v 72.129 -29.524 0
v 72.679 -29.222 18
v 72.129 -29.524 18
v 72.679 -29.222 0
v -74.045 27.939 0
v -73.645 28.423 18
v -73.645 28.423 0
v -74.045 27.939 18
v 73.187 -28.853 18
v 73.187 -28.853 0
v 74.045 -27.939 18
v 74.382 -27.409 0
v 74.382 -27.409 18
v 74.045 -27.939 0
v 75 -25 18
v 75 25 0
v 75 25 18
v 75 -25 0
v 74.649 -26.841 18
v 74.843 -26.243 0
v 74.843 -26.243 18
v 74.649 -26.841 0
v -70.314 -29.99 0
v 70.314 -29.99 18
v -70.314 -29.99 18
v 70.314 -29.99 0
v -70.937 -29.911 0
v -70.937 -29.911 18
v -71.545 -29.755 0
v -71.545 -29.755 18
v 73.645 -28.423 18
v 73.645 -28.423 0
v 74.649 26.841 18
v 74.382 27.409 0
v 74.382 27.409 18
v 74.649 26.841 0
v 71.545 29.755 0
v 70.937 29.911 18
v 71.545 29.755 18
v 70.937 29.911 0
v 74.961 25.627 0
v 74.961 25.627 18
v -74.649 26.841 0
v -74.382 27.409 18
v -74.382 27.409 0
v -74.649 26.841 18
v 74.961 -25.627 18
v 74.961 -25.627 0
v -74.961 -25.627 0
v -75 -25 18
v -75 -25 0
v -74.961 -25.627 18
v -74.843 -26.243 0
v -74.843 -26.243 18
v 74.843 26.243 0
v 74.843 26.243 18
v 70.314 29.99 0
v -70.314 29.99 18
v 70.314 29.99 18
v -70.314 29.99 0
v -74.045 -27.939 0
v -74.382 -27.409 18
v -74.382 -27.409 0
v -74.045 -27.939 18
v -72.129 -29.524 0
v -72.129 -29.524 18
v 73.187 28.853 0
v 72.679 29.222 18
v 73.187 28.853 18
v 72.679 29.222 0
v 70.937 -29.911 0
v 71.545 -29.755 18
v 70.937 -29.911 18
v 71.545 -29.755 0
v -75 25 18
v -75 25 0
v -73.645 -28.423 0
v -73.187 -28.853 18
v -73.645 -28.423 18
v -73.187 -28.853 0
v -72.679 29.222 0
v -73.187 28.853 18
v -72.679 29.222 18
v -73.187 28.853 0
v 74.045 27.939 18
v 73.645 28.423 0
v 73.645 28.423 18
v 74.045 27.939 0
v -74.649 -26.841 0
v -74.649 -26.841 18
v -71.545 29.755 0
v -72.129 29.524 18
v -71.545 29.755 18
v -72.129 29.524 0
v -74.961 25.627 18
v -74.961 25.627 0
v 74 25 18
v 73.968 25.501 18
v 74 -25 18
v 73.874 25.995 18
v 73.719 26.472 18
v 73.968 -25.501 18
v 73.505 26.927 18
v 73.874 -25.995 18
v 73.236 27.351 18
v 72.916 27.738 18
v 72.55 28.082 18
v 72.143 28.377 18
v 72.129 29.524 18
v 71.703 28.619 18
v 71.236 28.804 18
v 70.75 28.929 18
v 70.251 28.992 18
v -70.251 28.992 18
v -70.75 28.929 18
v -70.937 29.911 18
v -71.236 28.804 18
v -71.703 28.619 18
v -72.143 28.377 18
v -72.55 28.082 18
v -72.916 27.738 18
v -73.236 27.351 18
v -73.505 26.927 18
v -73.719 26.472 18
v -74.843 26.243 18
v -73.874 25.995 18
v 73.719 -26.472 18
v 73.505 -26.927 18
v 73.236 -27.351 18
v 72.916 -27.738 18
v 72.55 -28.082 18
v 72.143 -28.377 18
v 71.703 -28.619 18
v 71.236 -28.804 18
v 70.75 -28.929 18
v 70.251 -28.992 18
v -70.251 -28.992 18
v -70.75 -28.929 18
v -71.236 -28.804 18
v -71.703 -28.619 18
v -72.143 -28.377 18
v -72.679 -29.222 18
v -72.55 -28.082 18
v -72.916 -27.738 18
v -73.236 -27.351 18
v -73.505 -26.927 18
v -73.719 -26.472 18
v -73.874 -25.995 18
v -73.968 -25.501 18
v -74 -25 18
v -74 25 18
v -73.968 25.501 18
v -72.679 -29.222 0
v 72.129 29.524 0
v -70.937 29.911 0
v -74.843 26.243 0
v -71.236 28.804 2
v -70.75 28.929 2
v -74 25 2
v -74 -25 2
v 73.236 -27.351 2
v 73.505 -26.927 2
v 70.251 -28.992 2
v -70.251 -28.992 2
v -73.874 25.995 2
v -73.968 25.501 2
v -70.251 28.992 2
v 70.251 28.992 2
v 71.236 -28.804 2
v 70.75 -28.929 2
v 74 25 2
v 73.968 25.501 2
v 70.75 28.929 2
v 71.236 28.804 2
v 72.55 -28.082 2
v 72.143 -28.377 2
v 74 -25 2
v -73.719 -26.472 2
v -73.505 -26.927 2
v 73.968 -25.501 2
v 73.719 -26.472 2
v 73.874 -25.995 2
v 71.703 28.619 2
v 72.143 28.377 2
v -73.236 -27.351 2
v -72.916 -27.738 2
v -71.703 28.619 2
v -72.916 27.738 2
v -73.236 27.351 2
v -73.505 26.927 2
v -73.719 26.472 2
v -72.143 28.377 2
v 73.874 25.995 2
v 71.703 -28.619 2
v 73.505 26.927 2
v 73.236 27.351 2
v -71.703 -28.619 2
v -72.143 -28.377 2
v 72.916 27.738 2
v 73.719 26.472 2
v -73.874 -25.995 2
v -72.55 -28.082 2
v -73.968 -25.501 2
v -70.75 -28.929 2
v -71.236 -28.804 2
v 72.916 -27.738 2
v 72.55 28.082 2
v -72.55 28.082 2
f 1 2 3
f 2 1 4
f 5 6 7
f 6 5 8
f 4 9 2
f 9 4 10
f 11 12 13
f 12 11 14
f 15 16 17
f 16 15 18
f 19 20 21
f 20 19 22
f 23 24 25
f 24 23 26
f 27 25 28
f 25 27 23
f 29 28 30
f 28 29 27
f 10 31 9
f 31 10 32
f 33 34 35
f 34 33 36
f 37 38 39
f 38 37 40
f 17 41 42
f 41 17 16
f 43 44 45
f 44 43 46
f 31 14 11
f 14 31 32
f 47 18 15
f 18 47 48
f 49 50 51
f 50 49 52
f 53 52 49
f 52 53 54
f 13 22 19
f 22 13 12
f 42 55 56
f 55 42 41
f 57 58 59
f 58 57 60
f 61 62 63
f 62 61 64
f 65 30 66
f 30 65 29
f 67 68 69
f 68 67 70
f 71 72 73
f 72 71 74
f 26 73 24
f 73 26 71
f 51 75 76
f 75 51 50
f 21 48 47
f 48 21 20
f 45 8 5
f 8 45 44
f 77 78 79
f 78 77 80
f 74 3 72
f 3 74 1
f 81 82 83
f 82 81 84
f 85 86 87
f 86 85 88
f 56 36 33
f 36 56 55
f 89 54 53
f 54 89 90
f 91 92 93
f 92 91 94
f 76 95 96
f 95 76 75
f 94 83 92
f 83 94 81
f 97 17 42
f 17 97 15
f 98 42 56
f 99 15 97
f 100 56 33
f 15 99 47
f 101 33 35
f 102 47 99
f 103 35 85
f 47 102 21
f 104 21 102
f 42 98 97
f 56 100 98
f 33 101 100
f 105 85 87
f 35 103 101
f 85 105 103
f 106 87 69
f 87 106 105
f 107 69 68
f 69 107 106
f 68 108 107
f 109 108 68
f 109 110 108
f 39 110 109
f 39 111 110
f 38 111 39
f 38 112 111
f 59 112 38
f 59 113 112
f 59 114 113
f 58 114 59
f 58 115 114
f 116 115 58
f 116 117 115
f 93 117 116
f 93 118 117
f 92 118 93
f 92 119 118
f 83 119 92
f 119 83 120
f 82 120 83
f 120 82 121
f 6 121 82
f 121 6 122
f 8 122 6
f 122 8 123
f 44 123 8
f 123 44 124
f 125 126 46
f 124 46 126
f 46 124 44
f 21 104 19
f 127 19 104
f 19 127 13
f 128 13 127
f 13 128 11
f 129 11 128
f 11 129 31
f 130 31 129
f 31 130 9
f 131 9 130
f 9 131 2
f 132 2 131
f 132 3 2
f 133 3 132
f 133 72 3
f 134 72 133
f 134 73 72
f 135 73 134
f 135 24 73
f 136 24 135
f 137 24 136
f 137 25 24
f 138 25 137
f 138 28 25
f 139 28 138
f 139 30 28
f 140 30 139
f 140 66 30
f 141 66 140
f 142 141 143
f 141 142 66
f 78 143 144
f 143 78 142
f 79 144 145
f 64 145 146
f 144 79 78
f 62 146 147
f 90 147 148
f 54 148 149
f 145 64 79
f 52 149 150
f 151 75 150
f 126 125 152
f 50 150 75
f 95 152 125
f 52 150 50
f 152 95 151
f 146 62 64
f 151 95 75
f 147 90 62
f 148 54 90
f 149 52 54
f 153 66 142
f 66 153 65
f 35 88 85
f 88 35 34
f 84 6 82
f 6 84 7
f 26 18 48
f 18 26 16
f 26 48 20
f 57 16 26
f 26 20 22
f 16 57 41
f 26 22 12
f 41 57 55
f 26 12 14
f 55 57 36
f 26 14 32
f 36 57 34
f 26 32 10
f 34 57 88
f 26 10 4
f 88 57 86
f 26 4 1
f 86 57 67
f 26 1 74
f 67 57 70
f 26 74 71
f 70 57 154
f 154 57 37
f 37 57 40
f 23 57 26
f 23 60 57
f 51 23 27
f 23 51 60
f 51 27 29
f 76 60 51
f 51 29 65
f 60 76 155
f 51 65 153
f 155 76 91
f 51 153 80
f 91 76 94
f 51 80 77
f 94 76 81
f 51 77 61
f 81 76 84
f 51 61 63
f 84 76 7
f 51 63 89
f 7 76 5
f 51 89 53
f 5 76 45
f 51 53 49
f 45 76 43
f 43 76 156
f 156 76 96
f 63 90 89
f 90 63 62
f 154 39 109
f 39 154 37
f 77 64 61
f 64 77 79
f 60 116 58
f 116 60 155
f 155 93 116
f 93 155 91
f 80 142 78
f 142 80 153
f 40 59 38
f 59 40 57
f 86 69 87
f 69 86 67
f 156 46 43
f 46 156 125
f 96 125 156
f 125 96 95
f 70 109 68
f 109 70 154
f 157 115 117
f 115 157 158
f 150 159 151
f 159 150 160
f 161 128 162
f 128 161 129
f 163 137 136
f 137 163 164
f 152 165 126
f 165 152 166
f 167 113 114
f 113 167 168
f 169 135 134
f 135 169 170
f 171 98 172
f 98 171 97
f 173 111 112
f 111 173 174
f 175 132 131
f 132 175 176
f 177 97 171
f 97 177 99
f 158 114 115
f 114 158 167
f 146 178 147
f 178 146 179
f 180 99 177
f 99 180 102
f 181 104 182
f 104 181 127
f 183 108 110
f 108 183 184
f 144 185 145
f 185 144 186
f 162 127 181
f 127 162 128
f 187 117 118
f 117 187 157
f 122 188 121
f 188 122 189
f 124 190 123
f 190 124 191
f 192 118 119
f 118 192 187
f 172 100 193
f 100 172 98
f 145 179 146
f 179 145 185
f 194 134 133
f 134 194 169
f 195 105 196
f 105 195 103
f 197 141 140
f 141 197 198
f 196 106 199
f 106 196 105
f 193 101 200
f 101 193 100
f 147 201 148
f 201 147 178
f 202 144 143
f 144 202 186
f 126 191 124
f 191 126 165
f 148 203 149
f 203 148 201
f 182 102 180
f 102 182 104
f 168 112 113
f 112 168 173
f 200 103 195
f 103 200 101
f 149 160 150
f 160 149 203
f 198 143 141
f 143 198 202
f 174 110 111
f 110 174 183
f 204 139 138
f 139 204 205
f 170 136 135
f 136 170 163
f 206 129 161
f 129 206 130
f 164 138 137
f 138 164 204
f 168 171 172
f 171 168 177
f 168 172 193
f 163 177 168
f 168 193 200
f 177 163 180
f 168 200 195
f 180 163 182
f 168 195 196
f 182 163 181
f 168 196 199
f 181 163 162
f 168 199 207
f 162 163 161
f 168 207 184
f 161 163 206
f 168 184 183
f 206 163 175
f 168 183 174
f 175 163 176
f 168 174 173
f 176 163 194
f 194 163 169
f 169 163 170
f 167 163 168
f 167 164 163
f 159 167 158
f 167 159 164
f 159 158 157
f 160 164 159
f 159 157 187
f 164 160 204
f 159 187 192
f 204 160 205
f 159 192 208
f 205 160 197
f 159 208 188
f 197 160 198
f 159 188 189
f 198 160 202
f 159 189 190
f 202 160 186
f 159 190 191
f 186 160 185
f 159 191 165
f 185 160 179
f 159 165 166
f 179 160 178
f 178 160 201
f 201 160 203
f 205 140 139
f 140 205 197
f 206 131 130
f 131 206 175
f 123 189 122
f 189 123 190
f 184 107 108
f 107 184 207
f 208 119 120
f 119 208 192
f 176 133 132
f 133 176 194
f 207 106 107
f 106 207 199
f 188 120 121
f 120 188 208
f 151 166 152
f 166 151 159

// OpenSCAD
$fn = 50;


difference() {
	union() {
		hull() {
			translate(v = [-70.0000000000, 25.0000000000, 0]) {
				cylinder(h = 18, r = 5);
			}
			translate(v = [70.0000000000, 25.0000000000, 0]) {
				cylinder(h = 18, r = 5);
			}
			translate(v = [-70.0000000000, -25.0000000000, 0]) {
				cylinder(h = 18, r = 5);
			}
			translate(v = [70.0000000000, -25.0000000000, 0]) {
				cylinder(h = 18, r = 5);
			}
		}
	}
	union() {
		translate(v = [0, 0, 2]) {
			hull() {
				translate(v = [-70.0000000000, 25.0000000000, 0]) {
					cylinder(h = 16, r = 4);
				}
				translate(v = [70.0000000000, 25.0000000000, 0]) {
					cylinder(h = 16, r = 4);
				}
				translate(v = [-70.0000000000, -25.0000000000, 0]) {
					cylinder(h = 16, r = 4);
				}
				translate(v = [70.0000000000, -25.0000000000, 0]) {
					cylinder(h = 16, r = 4);
				}
			}
		}
	}
}
